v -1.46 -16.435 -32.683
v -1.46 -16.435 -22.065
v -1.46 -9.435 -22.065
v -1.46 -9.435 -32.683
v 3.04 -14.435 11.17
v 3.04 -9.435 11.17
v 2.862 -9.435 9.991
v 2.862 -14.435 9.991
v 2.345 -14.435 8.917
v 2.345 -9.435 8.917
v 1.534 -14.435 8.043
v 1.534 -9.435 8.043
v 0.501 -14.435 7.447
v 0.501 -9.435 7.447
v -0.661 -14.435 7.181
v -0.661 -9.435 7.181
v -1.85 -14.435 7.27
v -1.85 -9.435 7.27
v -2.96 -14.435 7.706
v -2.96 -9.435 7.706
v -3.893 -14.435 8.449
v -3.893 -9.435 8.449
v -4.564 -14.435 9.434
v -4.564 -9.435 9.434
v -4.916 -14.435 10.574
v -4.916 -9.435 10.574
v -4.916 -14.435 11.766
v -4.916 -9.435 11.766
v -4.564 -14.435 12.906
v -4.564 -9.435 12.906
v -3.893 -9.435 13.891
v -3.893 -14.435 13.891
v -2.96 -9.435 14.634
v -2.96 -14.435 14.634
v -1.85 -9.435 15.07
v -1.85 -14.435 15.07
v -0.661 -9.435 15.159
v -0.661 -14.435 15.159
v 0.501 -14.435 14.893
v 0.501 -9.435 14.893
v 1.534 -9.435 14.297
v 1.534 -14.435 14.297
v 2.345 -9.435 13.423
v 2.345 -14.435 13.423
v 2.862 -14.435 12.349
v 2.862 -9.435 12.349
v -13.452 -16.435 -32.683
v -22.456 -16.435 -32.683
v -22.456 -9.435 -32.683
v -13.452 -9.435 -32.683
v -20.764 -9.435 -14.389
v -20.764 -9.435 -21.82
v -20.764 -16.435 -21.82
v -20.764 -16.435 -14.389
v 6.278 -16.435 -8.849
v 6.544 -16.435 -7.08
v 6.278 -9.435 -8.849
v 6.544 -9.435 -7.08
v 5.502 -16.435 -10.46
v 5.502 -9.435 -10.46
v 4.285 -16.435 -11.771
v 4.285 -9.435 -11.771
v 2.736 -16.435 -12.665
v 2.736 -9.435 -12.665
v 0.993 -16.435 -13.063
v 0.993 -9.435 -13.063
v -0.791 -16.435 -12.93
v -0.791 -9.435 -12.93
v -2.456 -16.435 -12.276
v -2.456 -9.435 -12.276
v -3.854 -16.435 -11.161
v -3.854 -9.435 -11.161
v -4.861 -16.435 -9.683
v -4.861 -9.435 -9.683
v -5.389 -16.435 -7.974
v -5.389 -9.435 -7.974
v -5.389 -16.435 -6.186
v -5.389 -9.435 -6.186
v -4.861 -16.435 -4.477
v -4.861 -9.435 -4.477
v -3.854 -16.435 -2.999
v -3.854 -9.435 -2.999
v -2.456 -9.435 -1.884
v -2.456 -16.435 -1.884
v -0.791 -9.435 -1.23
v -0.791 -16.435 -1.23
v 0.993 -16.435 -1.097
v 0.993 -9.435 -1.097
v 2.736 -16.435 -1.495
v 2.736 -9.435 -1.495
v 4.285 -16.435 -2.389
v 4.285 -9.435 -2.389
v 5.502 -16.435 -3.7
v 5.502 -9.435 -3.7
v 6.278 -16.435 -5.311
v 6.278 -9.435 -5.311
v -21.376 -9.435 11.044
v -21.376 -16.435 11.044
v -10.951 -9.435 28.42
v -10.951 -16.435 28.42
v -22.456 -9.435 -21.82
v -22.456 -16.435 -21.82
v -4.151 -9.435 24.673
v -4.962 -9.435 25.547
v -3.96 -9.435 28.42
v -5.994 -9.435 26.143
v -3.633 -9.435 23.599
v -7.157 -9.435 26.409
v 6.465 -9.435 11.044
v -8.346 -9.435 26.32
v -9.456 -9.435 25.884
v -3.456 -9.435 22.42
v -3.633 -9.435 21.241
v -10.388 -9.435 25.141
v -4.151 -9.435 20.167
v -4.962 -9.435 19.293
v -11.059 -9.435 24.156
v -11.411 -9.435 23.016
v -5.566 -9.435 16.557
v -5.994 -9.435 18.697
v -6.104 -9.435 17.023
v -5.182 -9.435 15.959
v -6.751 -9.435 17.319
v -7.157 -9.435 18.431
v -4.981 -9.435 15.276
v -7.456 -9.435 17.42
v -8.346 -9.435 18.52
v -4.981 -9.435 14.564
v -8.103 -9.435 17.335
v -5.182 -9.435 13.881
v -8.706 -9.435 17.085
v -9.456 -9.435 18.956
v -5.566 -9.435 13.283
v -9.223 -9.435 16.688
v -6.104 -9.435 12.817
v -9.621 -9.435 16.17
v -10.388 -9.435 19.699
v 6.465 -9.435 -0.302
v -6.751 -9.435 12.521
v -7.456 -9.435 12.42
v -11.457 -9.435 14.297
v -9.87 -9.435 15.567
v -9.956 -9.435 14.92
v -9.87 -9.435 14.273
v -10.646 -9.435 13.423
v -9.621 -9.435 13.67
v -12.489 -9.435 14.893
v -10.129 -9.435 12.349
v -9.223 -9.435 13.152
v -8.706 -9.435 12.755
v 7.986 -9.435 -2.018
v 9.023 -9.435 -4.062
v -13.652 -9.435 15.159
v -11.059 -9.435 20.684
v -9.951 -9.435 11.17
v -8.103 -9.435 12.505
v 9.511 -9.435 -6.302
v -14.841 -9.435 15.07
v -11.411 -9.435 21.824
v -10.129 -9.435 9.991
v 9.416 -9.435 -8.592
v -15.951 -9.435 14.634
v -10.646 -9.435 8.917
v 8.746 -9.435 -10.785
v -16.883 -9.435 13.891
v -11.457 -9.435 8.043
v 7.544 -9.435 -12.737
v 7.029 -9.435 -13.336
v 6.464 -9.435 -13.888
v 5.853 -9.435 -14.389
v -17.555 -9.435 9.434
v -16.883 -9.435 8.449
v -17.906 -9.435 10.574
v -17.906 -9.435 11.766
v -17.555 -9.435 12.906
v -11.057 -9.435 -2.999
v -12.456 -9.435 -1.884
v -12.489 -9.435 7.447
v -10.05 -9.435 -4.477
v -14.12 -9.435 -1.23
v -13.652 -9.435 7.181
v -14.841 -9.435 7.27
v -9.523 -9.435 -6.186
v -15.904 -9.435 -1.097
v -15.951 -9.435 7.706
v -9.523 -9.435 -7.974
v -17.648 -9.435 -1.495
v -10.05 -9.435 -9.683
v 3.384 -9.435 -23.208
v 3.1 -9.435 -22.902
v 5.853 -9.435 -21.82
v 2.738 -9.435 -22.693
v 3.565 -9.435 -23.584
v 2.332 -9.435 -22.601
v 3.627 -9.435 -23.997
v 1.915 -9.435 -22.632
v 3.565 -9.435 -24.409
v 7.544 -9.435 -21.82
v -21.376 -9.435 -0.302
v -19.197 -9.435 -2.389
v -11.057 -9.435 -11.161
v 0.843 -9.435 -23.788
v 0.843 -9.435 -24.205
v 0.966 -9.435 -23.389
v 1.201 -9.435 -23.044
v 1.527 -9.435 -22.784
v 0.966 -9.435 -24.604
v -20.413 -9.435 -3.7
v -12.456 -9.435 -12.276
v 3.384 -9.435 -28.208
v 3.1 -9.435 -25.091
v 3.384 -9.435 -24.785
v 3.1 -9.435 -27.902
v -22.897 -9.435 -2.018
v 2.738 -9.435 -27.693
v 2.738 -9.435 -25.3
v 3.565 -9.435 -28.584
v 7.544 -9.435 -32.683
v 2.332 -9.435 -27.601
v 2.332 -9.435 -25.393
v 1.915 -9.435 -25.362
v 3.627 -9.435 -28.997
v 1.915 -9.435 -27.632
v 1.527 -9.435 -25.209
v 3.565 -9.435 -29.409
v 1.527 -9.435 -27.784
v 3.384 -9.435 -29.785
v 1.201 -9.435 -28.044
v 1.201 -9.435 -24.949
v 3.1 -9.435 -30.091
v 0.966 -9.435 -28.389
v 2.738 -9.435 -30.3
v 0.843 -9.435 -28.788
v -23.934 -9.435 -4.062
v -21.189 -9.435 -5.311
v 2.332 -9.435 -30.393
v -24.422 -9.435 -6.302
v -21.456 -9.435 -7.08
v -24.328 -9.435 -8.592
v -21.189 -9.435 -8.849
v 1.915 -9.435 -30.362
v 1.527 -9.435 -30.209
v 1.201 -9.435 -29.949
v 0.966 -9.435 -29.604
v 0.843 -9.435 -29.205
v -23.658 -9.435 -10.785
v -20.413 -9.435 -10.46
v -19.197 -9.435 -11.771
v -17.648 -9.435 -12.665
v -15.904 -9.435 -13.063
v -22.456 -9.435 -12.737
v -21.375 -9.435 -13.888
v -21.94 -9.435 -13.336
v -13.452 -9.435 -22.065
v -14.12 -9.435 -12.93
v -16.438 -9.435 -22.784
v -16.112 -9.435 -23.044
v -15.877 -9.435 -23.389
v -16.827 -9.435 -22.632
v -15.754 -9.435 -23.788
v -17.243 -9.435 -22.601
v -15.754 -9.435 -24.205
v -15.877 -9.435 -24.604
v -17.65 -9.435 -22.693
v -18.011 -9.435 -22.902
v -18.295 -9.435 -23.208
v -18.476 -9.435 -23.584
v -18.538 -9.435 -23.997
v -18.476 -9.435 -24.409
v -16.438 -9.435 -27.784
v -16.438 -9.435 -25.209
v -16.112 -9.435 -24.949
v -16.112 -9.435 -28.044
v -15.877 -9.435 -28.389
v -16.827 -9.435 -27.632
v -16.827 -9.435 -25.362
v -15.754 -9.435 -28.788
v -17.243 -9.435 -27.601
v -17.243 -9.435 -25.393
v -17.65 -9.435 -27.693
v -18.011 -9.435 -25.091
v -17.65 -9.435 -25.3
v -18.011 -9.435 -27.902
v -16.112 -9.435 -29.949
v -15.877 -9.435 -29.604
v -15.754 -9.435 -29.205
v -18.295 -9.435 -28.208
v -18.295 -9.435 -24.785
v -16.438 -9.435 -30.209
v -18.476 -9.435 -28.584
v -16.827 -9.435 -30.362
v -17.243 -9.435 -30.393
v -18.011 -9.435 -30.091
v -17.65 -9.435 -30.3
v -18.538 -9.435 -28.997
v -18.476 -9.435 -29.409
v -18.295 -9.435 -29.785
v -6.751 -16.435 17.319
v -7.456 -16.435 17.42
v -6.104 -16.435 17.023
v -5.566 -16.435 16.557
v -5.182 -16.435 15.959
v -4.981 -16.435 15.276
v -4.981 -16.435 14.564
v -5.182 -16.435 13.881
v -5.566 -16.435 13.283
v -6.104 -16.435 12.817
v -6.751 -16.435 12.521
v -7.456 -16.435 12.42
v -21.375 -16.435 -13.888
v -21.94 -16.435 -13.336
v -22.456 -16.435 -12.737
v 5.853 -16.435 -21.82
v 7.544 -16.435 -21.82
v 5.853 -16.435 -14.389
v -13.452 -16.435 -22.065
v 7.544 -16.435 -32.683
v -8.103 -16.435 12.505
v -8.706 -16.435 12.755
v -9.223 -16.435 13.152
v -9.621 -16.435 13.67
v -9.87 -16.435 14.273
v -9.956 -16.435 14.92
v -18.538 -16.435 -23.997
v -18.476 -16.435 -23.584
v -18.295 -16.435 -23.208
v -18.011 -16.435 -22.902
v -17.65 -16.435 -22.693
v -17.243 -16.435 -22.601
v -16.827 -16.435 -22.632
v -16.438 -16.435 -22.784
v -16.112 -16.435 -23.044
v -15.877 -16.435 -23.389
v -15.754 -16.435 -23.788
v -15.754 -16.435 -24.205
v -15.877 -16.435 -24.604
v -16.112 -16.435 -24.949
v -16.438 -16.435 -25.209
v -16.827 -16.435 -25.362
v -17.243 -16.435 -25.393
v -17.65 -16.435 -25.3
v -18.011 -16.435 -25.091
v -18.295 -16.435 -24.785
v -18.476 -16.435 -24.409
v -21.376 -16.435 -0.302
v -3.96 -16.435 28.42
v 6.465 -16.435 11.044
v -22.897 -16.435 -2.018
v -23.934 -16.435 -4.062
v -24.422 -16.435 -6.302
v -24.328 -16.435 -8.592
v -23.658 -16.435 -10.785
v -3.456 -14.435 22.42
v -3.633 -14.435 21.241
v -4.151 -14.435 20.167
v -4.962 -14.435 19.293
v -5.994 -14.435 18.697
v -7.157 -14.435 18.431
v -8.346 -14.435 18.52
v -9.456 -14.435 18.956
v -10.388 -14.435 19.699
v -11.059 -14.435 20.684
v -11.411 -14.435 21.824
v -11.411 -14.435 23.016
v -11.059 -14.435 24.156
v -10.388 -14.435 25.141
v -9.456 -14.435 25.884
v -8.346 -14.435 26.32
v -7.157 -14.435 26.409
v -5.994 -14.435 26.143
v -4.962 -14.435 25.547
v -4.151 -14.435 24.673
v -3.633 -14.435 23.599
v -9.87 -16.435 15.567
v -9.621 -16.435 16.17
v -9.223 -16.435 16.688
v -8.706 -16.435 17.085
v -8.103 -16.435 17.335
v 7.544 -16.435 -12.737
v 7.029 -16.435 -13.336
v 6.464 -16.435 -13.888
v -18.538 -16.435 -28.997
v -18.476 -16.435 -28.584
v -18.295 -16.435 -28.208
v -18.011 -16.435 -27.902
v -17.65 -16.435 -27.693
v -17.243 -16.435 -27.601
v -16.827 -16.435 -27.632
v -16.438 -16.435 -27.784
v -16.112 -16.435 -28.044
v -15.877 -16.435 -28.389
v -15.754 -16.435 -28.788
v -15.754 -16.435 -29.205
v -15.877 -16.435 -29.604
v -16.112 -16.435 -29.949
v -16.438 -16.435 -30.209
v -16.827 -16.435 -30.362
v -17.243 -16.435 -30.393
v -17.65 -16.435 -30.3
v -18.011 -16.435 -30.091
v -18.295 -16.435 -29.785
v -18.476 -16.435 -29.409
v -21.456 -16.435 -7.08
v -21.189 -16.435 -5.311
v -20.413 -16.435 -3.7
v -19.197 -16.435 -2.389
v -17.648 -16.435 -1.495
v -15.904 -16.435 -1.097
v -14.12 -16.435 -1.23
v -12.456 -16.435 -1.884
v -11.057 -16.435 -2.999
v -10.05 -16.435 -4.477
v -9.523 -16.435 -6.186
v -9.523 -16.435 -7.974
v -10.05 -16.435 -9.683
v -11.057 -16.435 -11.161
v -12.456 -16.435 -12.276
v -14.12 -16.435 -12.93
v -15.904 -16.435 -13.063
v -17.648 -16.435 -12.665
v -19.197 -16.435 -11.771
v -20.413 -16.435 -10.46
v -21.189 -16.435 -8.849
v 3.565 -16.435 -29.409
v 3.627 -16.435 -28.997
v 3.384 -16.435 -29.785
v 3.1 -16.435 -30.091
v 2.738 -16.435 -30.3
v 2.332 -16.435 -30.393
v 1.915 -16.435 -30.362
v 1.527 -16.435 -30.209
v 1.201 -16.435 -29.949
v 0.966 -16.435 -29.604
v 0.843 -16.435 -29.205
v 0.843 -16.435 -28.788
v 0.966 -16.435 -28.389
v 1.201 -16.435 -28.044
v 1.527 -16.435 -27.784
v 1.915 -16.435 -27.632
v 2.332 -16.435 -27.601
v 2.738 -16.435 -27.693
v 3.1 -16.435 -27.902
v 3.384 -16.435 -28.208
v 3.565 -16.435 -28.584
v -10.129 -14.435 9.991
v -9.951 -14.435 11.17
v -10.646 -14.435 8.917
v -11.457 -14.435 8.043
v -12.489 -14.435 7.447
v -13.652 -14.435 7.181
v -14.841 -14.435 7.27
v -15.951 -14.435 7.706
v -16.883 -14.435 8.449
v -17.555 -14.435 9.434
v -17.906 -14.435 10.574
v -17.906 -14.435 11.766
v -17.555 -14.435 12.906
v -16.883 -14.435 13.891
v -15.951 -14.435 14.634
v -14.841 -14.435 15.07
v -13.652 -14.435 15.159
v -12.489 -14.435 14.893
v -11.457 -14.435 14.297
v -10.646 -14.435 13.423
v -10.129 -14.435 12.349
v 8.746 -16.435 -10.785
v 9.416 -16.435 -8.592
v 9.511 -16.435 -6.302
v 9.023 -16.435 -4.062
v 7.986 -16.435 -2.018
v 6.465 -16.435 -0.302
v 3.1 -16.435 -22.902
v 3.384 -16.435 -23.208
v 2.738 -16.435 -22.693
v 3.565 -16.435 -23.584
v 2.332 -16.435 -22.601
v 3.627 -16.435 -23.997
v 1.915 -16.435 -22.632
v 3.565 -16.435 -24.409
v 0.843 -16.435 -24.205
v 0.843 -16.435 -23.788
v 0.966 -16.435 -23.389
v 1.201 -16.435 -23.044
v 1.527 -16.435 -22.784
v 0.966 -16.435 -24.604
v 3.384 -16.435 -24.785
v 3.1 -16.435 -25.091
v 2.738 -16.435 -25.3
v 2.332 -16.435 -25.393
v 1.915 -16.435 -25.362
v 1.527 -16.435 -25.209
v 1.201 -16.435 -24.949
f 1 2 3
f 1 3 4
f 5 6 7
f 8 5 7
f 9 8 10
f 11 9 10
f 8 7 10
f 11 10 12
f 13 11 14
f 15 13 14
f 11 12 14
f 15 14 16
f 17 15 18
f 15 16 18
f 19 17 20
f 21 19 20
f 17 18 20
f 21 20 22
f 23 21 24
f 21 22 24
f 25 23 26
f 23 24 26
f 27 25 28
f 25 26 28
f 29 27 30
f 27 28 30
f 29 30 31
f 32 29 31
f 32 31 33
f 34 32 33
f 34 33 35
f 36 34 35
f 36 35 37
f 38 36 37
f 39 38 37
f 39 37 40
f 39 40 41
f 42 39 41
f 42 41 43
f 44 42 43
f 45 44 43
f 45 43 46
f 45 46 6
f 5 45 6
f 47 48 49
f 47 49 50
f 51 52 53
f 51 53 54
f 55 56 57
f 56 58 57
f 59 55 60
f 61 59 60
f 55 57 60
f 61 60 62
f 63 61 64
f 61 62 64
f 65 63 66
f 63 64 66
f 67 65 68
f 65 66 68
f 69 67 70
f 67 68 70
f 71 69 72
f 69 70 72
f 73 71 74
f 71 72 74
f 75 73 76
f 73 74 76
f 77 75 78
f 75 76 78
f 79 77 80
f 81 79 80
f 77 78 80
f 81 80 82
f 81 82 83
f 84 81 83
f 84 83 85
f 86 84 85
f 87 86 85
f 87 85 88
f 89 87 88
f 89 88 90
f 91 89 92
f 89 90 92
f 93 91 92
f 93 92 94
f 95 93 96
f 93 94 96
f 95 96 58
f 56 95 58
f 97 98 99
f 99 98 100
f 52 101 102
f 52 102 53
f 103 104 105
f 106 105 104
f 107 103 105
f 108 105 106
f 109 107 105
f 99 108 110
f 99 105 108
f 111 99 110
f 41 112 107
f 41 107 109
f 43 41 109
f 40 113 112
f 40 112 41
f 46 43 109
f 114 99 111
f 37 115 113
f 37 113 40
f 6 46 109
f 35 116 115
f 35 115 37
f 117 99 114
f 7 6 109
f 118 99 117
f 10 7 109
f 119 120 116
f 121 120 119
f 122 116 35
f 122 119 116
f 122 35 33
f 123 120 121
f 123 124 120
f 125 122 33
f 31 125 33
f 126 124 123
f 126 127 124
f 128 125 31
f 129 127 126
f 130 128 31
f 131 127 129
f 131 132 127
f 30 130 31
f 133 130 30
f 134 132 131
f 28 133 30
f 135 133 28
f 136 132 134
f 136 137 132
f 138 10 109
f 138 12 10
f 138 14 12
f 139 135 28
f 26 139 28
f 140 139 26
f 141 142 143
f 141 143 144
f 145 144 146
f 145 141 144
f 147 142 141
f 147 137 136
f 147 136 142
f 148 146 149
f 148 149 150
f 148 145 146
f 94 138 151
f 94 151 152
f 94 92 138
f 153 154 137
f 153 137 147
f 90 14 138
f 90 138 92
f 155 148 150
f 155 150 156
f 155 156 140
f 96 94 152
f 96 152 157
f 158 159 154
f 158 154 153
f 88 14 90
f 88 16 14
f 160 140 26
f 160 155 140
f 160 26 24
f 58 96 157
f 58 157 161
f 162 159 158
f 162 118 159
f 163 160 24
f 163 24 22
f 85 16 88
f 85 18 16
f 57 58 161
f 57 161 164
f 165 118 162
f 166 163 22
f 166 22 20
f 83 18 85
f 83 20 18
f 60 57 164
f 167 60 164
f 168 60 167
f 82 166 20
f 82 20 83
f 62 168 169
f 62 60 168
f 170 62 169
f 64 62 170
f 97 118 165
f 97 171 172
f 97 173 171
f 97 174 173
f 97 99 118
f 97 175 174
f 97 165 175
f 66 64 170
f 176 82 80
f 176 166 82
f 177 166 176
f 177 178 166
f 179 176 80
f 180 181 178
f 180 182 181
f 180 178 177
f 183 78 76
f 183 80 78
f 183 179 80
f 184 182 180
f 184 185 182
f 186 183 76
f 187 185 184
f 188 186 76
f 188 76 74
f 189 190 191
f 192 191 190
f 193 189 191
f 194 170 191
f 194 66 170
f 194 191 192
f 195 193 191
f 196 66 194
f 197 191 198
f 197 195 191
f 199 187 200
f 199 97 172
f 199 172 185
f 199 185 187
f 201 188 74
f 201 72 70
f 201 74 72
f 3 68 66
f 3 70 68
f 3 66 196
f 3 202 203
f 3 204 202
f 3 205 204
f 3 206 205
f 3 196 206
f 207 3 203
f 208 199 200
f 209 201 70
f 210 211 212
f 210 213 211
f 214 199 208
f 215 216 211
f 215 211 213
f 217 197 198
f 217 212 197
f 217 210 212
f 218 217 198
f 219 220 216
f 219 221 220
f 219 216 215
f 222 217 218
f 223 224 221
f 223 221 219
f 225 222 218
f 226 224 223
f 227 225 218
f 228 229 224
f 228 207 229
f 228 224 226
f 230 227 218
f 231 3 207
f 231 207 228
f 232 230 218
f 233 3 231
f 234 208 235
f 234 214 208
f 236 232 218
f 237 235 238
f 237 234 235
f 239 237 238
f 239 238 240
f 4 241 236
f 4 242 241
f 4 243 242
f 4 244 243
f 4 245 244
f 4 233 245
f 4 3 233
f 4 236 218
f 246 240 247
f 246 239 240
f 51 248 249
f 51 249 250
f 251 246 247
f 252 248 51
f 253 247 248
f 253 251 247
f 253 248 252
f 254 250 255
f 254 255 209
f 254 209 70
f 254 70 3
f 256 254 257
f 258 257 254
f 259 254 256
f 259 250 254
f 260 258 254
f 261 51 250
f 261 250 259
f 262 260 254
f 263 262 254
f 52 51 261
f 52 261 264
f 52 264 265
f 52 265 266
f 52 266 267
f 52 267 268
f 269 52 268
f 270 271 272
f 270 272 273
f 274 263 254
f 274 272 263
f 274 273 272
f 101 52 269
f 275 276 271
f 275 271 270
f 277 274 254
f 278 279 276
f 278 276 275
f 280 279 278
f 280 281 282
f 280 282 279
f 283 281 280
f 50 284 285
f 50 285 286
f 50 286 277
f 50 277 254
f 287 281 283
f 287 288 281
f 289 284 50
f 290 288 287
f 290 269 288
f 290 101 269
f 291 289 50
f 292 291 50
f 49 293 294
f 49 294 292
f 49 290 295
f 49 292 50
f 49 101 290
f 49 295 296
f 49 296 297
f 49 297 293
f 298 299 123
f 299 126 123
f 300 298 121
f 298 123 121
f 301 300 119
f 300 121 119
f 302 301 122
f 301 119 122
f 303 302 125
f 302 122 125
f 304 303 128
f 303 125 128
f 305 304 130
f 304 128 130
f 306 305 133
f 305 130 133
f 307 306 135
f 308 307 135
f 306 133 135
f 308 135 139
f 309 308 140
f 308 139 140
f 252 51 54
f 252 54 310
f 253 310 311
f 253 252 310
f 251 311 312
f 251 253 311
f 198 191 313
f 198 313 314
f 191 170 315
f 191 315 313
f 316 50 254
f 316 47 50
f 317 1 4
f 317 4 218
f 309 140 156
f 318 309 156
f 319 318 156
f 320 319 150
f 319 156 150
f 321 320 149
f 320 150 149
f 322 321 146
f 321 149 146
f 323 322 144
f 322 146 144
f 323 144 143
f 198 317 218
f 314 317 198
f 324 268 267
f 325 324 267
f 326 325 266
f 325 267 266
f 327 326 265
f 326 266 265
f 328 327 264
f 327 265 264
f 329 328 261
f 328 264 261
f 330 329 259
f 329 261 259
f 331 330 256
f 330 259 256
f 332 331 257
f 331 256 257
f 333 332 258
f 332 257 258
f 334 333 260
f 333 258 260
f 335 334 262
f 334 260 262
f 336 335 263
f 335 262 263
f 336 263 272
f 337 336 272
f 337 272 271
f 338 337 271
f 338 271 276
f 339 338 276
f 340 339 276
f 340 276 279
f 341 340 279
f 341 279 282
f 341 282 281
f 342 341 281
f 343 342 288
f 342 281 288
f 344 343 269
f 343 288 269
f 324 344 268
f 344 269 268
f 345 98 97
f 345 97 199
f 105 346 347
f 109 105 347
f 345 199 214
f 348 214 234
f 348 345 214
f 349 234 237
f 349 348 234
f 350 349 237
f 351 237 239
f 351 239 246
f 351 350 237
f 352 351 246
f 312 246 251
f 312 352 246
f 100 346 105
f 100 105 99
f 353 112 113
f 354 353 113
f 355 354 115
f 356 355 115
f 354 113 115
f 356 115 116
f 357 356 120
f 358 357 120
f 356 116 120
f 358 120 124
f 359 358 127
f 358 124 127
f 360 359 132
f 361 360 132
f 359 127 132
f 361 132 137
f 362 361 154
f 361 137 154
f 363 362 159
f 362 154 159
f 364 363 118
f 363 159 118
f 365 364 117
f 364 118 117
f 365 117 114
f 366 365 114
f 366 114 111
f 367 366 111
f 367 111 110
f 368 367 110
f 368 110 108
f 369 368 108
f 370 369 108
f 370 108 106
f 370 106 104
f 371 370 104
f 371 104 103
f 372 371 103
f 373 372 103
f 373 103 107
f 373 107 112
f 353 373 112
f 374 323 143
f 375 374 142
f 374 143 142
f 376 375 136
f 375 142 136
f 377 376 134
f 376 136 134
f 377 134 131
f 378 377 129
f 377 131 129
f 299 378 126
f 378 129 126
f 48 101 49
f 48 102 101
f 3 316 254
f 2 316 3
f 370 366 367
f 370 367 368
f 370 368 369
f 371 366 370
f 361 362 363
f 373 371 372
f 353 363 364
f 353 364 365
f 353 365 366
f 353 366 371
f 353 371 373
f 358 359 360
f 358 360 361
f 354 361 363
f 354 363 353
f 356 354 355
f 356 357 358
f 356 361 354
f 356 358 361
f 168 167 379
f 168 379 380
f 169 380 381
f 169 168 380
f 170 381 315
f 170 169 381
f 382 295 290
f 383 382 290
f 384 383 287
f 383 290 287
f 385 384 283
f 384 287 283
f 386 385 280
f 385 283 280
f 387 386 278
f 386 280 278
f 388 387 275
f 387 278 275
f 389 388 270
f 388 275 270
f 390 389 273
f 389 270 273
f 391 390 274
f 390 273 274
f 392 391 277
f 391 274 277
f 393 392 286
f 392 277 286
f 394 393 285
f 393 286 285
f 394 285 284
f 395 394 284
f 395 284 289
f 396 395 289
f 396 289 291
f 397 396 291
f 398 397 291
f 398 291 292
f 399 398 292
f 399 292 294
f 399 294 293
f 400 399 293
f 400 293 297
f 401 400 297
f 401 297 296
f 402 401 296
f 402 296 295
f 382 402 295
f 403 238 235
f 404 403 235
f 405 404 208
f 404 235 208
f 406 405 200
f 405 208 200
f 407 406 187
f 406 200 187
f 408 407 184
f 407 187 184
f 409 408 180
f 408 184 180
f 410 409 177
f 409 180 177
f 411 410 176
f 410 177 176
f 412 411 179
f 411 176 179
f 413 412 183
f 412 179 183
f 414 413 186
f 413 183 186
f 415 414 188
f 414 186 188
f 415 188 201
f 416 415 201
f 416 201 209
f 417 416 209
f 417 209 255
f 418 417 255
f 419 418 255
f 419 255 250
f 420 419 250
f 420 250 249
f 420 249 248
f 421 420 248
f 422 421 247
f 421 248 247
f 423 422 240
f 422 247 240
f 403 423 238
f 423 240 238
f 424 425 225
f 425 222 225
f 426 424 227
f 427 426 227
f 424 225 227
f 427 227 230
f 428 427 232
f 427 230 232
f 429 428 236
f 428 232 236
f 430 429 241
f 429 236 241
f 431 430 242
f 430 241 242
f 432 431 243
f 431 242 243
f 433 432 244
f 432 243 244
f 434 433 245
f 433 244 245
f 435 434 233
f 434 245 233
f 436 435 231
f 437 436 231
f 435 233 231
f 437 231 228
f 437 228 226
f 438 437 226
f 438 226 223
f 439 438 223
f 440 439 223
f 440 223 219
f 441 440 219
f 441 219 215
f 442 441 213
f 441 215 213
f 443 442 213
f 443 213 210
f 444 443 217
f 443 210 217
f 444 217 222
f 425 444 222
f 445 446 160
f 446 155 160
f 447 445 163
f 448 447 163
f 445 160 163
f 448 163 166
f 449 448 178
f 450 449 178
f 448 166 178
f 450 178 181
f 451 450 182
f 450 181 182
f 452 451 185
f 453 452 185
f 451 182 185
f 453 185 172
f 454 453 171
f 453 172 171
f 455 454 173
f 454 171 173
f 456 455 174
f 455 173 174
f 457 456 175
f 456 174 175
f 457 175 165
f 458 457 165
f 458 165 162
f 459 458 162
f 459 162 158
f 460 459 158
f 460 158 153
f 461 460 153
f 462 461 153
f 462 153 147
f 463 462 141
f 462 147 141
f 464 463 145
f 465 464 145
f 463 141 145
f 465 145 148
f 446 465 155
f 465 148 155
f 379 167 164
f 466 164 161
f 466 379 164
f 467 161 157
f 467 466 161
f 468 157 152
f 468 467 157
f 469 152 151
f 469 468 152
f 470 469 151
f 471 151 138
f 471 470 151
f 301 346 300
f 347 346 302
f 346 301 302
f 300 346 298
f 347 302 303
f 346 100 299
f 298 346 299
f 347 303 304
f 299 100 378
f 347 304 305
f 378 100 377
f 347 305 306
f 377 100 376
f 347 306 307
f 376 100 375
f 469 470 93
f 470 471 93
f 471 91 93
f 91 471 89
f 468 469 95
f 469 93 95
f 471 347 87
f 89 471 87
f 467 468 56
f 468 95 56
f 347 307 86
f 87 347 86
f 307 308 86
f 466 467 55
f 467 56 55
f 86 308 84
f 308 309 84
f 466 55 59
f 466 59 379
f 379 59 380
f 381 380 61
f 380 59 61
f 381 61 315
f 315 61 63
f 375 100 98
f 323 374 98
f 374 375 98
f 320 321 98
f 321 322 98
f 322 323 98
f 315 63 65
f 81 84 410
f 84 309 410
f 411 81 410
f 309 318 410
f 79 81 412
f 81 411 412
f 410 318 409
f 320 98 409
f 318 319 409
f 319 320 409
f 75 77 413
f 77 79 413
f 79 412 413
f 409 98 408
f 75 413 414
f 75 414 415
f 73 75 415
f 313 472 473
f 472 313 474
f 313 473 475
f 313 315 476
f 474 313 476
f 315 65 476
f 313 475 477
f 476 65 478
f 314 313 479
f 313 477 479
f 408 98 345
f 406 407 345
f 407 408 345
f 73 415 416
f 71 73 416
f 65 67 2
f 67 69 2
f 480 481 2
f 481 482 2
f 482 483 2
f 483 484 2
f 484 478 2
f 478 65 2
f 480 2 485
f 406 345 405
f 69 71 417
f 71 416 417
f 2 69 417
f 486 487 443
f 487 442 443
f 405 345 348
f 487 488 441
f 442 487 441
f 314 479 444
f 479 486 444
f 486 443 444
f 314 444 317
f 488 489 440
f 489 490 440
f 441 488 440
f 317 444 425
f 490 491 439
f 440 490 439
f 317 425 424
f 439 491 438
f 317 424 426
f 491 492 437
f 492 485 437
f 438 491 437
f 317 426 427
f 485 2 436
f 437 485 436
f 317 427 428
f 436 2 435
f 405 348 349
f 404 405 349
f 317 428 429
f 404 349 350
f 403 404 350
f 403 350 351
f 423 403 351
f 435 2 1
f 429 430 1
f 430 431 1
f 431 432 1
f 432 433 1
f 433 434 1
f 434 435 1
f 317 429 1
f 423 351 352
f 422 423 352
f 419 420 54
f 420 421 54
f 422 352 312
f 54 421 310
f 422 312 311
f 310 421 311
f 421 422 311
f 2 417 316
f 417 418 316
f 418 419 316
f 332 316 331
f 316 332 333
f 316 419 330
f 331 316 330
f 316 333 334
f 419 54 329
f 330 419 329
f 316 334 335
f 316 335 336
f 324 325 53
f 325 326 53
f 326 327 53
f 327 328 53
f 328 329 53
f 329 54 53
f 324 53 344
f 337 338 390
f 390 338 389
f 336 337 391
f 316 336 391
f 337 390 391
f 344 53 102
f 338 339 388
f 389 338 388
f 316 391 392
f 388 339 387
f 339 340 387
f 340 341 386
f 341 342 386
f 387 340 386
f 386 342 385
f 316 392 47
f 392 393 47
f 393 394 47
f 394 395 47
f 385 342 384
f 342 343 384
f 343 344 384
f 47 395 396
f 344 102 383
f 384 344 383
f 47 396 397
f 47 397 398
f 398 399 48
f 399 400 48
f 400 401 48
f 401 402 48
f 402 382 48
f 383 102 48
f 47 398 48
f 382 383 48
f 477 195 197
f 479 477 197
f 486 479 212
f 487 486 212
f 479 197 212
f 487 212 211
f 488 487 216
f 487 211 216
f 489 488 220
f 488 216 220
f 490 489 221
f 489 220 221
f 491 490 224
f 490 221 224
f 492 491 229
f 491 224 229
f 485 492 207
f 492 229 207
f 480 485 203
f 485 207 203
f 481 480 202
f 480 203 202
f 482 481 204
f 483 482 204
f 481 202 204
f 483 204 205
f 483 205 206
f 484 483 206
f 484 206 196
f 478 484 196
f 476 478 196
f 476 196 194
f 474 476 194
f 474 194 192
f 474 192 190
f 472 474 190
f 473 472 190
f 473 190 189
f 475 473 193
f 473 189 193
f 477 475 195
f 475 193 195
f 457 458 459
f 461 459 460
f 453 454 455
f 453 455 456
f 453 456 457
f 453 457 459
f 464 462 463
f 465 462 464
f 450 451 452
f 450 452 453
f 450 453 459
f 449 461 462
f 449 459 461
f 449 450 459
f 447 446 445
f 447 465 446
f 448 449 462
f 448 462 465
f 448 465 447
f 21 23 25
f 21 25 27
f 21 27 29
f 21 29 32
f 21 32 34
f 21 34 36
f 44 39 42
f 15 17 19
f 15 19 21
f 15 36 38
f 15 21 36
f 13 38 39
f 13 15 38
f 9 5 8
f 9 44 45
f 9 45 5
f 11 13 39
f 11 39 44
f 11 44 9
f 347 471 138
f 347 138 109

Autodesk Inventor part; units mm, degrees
ref_plane "YZ Plane" through (0, 0, 0) normal (1, 0, 0) x (0, 1, 0)
ref_plane "XZ Plane" through (0, 0, 0) normal (0, 1, 0) x (-1, 0, 0)
ref_plane "XY Plane" through (0, 0, 0) normal (0, 0, 1) x (1, 0, 0)
ref_plane "Work Plane8" through (-7.4556, -16.4352, 24.63) normal (0, 1, 0) x (0, 0, -1)
sketch "Sketch12" plane through (-7.4556, -16.4352, 24.63) normal (0, 1, 0) x (0, 0, -1)
  circle A0 centre (31.71, -8) radius 6 construction
  circle A1 centre (31.71, 8) radius 6 construction
  line L0 (59.1648, 4.9103) -> (72.1552, 12.4103) construction
  arc A2 (80.66, 7.5) -> (72.1552, 12.4103) centre (70.66, 0) ccw construction
  line L1 (80.66, 7.5) -> (80.66, -7.5) construction
  arc A3 (72.1552, -12.4103) -> (80.66, -7.5) centre (70.66, 0) ccw construction
  line L2 (72.1552, -12.4103) -> (59.1648, -4.9103) construction
  arc A4 (59.1648, 4.9103) -> (59.1648, -4.9103) centre (70.66, 0) ccw construction
  line L3 (57.3131, 5.945) -> (46.6951, 5.945) construction
  line L4 (46.6951, 5.945) -> (46.6951, -5.9961)
  line L5 (46.6951, -5.9961) -> (57.3131, -5.9961)
  line L6 (57.3131, -5.9961) -> (57.3131, -15)
  line L7 (57.3131, -15) -> (85.66, -15) construction
  line L8 (85.66, -15) -> (85.66, 15) construction
  line L9 (85.66, 15) -> (57.3131, 15) construction
  line L10 (57.3131, 15) -> (57.3131, 5.945) construction
  line L11 (46.6951, -6.3061) -> (57.3131, -6.3061)
  line L12 (3.89, -16.97) -> (37.83, -16.97)
  line L13 (41.63, -16.87) -> (45.71, -16.87)
  line L14 (55.66, -15) -> (46.2855, -13.3689)
  line L15 (55.66, -15) -> (105.1976, -15) construction
  line L16 (46.6951, 0) -> (46.6951, -6.3061)
  arc A5 (24.9318, -13.9208) -> (37.3669, -15) centre (31.71, -8) ccw
  line L17 (24.9318, -13.9208) -> (13.5861, -13.9208)
  line L18 (-3.79, -3.4952) -> (-3.79, 3.4952)
  line L19 (-3.79, 0) -> (-3.79, 0)
  line L20 (-3.79, 0) -> (-3.79, -3.4952)
  line L21 (-3.79, -3.4952) -> (13.5861, -13.9208)
  line L22 (46.6951, 0) -> (-3.79, 0)
  line L23 (57.3131, -6.3061) -> (57.3131, -15)
  line L24 (57.3131, -15) -> (37.3669, -15)
  line L25 (-3.79, -8.16) -> (-3.79, 8.16)
  line L26 (19.46, 16.4952) -> (10.1021, 16.4952)
  line L27 (19.46, -16.4952) -> (19.46, 16.4952)
  line L28 (10.1021, -16.4952) -> (19.46, -16.4952)
  line L29 (10.1021, 16.4952) -> (-3.79, 8.16)
  line L30 (-3.79, -8.16) -> (10.1021, -16.4952)
  circle A6 centre (9.71, 0) radius 1.75
  point P0 (24.63, -7.4556)
  point P1 (11.21, -12.4952)
  point P2 (19.46, 12.4952)
  point P3 (19.46, -12.4952)
extrude "Extrusion11" add sketch "Sketch12" along normal blind 7 contours L4 L16 L11 L6 L24 A5 L12 L17 L27 L22 | L5 L6 L11 L16 | L27 L17 L21 L18 L22 A6 | A6 L22 | L12 A5 picked at (9.6397, -0.5791)
sketch "Sketch13" plane through (-7.4556, -9.4352, 24.63) normal (0, 1, 0) x (1, 0, 0)
  circle A0 centre (8, 31.71) radius 6 projected
  circle A1 centre (8, 31.71) radius 6.1
  circle A2 centre (9.6825, 53.6267) radius 1.4 projected
  circle A3 centre (9.6825, 48.6267) radius 1.4 projected
  circle A4 centre (0, 9.71) radius 2.5 projected
  point P0 (7.4556, 24.63)
  dimension "d68" = 12.2
extrude "Extrusion12" cut sketch "Sketch13" against normal through all contours A0 | A2 | A3 | A4
sketch "Sketch16" plane through (-7.4556, -9.4352, 24.63) normal (0, 1, 0) x (1, 0, 0)
  line L0 (13.9208, 13.5861) -> (13.9208, 24.9318) projected
  arc A0 (13.9208, 24.9318) -> (15, 37.3669) centre (8, 31.71) ccw projected
  line L1 (5.9961, 46.6951) -> (0, 46.6951) projected
  line L2 (13.8689, 40.3869) -> (13.8689, 45.71) projected
  line L3 (15, 39.0186) -> (13.3086, 39.0186)
  line L4 (13.3086, 39.0186) -> (13.3086, 46.45)
  line L5 (13.3086, 46.45) -> (15, 46.45)
  line L6 (15, 46.45) -> (15, 39.0186)
  arc A1 (15, 37.3669) -> (13.3086, 39.0186) centre (7.8235, 31.71) ccw
  line L7 (13.3086, 46.45) -> (15, 48.1414)
  line L8 (15, 37.3669) -> (15, 57.3131) projected
  line L9 (13.3086, 46.45) -> (15.7006, 46.45) construction
  line L10 (15, 48.1414) -> (15, 46.45)
  line L11 (15, 39.0186) -> (15, 37.3669)
  line L12 (0, 7.21) -> (0, -3.79) projected
  line L13 (0, -3.79) -> (3.4952, -3.79) projected
  line L14 (3.4952, -3.79) -> (13.9208, 13.5861) projected
  line L15 (15, 37.3669) -> (15, 57.3131) projected
  line L16 (15, 57.3131) -> (5.9961, 57.3131) projected
  line L17 (5.9961, 57.3131) -> (5.9961, 46.6951) projected
  arc A2 (0, 7.21) -> (0, 12.21) centre (0, 9.71) ccw projected
  line L18 (0, 46.6951) -> (0, 12.21) projected
  point P0 (7.4556, 24.63)
  dimension "d80" = 45
extrude "Extrusion15" cut sketch "Sketch16" against normal through all contours A1 L3 L8 | L4 L5 L6 L3
mirror "Mirror3" about plane through (-7.4556, -16.4352, -22.0651) normal (-1, 0, 0) of "Extrusion11", "Extrusion12", "Extrusion15"
sketch "Sketch17" plane through (-7.4556, -9.4352, 24.63) normal (0, 1, 0) x (1, 0, 0)
  circle A0 centre (6.4952, 13.46) radius 4 projected
  circle A1 centre (0, 2.21) radius 4 projected
  circle A2 centre (-6.4952, 13.46) radius 4 projected
  point P0 (7.4556, 24.63)
extrude "Extrusion16" cut sketch "Sketch17" against normal blind 5
properties part number "30_Cube_Z_Focus_MGN_NEMA_slide_part2"
